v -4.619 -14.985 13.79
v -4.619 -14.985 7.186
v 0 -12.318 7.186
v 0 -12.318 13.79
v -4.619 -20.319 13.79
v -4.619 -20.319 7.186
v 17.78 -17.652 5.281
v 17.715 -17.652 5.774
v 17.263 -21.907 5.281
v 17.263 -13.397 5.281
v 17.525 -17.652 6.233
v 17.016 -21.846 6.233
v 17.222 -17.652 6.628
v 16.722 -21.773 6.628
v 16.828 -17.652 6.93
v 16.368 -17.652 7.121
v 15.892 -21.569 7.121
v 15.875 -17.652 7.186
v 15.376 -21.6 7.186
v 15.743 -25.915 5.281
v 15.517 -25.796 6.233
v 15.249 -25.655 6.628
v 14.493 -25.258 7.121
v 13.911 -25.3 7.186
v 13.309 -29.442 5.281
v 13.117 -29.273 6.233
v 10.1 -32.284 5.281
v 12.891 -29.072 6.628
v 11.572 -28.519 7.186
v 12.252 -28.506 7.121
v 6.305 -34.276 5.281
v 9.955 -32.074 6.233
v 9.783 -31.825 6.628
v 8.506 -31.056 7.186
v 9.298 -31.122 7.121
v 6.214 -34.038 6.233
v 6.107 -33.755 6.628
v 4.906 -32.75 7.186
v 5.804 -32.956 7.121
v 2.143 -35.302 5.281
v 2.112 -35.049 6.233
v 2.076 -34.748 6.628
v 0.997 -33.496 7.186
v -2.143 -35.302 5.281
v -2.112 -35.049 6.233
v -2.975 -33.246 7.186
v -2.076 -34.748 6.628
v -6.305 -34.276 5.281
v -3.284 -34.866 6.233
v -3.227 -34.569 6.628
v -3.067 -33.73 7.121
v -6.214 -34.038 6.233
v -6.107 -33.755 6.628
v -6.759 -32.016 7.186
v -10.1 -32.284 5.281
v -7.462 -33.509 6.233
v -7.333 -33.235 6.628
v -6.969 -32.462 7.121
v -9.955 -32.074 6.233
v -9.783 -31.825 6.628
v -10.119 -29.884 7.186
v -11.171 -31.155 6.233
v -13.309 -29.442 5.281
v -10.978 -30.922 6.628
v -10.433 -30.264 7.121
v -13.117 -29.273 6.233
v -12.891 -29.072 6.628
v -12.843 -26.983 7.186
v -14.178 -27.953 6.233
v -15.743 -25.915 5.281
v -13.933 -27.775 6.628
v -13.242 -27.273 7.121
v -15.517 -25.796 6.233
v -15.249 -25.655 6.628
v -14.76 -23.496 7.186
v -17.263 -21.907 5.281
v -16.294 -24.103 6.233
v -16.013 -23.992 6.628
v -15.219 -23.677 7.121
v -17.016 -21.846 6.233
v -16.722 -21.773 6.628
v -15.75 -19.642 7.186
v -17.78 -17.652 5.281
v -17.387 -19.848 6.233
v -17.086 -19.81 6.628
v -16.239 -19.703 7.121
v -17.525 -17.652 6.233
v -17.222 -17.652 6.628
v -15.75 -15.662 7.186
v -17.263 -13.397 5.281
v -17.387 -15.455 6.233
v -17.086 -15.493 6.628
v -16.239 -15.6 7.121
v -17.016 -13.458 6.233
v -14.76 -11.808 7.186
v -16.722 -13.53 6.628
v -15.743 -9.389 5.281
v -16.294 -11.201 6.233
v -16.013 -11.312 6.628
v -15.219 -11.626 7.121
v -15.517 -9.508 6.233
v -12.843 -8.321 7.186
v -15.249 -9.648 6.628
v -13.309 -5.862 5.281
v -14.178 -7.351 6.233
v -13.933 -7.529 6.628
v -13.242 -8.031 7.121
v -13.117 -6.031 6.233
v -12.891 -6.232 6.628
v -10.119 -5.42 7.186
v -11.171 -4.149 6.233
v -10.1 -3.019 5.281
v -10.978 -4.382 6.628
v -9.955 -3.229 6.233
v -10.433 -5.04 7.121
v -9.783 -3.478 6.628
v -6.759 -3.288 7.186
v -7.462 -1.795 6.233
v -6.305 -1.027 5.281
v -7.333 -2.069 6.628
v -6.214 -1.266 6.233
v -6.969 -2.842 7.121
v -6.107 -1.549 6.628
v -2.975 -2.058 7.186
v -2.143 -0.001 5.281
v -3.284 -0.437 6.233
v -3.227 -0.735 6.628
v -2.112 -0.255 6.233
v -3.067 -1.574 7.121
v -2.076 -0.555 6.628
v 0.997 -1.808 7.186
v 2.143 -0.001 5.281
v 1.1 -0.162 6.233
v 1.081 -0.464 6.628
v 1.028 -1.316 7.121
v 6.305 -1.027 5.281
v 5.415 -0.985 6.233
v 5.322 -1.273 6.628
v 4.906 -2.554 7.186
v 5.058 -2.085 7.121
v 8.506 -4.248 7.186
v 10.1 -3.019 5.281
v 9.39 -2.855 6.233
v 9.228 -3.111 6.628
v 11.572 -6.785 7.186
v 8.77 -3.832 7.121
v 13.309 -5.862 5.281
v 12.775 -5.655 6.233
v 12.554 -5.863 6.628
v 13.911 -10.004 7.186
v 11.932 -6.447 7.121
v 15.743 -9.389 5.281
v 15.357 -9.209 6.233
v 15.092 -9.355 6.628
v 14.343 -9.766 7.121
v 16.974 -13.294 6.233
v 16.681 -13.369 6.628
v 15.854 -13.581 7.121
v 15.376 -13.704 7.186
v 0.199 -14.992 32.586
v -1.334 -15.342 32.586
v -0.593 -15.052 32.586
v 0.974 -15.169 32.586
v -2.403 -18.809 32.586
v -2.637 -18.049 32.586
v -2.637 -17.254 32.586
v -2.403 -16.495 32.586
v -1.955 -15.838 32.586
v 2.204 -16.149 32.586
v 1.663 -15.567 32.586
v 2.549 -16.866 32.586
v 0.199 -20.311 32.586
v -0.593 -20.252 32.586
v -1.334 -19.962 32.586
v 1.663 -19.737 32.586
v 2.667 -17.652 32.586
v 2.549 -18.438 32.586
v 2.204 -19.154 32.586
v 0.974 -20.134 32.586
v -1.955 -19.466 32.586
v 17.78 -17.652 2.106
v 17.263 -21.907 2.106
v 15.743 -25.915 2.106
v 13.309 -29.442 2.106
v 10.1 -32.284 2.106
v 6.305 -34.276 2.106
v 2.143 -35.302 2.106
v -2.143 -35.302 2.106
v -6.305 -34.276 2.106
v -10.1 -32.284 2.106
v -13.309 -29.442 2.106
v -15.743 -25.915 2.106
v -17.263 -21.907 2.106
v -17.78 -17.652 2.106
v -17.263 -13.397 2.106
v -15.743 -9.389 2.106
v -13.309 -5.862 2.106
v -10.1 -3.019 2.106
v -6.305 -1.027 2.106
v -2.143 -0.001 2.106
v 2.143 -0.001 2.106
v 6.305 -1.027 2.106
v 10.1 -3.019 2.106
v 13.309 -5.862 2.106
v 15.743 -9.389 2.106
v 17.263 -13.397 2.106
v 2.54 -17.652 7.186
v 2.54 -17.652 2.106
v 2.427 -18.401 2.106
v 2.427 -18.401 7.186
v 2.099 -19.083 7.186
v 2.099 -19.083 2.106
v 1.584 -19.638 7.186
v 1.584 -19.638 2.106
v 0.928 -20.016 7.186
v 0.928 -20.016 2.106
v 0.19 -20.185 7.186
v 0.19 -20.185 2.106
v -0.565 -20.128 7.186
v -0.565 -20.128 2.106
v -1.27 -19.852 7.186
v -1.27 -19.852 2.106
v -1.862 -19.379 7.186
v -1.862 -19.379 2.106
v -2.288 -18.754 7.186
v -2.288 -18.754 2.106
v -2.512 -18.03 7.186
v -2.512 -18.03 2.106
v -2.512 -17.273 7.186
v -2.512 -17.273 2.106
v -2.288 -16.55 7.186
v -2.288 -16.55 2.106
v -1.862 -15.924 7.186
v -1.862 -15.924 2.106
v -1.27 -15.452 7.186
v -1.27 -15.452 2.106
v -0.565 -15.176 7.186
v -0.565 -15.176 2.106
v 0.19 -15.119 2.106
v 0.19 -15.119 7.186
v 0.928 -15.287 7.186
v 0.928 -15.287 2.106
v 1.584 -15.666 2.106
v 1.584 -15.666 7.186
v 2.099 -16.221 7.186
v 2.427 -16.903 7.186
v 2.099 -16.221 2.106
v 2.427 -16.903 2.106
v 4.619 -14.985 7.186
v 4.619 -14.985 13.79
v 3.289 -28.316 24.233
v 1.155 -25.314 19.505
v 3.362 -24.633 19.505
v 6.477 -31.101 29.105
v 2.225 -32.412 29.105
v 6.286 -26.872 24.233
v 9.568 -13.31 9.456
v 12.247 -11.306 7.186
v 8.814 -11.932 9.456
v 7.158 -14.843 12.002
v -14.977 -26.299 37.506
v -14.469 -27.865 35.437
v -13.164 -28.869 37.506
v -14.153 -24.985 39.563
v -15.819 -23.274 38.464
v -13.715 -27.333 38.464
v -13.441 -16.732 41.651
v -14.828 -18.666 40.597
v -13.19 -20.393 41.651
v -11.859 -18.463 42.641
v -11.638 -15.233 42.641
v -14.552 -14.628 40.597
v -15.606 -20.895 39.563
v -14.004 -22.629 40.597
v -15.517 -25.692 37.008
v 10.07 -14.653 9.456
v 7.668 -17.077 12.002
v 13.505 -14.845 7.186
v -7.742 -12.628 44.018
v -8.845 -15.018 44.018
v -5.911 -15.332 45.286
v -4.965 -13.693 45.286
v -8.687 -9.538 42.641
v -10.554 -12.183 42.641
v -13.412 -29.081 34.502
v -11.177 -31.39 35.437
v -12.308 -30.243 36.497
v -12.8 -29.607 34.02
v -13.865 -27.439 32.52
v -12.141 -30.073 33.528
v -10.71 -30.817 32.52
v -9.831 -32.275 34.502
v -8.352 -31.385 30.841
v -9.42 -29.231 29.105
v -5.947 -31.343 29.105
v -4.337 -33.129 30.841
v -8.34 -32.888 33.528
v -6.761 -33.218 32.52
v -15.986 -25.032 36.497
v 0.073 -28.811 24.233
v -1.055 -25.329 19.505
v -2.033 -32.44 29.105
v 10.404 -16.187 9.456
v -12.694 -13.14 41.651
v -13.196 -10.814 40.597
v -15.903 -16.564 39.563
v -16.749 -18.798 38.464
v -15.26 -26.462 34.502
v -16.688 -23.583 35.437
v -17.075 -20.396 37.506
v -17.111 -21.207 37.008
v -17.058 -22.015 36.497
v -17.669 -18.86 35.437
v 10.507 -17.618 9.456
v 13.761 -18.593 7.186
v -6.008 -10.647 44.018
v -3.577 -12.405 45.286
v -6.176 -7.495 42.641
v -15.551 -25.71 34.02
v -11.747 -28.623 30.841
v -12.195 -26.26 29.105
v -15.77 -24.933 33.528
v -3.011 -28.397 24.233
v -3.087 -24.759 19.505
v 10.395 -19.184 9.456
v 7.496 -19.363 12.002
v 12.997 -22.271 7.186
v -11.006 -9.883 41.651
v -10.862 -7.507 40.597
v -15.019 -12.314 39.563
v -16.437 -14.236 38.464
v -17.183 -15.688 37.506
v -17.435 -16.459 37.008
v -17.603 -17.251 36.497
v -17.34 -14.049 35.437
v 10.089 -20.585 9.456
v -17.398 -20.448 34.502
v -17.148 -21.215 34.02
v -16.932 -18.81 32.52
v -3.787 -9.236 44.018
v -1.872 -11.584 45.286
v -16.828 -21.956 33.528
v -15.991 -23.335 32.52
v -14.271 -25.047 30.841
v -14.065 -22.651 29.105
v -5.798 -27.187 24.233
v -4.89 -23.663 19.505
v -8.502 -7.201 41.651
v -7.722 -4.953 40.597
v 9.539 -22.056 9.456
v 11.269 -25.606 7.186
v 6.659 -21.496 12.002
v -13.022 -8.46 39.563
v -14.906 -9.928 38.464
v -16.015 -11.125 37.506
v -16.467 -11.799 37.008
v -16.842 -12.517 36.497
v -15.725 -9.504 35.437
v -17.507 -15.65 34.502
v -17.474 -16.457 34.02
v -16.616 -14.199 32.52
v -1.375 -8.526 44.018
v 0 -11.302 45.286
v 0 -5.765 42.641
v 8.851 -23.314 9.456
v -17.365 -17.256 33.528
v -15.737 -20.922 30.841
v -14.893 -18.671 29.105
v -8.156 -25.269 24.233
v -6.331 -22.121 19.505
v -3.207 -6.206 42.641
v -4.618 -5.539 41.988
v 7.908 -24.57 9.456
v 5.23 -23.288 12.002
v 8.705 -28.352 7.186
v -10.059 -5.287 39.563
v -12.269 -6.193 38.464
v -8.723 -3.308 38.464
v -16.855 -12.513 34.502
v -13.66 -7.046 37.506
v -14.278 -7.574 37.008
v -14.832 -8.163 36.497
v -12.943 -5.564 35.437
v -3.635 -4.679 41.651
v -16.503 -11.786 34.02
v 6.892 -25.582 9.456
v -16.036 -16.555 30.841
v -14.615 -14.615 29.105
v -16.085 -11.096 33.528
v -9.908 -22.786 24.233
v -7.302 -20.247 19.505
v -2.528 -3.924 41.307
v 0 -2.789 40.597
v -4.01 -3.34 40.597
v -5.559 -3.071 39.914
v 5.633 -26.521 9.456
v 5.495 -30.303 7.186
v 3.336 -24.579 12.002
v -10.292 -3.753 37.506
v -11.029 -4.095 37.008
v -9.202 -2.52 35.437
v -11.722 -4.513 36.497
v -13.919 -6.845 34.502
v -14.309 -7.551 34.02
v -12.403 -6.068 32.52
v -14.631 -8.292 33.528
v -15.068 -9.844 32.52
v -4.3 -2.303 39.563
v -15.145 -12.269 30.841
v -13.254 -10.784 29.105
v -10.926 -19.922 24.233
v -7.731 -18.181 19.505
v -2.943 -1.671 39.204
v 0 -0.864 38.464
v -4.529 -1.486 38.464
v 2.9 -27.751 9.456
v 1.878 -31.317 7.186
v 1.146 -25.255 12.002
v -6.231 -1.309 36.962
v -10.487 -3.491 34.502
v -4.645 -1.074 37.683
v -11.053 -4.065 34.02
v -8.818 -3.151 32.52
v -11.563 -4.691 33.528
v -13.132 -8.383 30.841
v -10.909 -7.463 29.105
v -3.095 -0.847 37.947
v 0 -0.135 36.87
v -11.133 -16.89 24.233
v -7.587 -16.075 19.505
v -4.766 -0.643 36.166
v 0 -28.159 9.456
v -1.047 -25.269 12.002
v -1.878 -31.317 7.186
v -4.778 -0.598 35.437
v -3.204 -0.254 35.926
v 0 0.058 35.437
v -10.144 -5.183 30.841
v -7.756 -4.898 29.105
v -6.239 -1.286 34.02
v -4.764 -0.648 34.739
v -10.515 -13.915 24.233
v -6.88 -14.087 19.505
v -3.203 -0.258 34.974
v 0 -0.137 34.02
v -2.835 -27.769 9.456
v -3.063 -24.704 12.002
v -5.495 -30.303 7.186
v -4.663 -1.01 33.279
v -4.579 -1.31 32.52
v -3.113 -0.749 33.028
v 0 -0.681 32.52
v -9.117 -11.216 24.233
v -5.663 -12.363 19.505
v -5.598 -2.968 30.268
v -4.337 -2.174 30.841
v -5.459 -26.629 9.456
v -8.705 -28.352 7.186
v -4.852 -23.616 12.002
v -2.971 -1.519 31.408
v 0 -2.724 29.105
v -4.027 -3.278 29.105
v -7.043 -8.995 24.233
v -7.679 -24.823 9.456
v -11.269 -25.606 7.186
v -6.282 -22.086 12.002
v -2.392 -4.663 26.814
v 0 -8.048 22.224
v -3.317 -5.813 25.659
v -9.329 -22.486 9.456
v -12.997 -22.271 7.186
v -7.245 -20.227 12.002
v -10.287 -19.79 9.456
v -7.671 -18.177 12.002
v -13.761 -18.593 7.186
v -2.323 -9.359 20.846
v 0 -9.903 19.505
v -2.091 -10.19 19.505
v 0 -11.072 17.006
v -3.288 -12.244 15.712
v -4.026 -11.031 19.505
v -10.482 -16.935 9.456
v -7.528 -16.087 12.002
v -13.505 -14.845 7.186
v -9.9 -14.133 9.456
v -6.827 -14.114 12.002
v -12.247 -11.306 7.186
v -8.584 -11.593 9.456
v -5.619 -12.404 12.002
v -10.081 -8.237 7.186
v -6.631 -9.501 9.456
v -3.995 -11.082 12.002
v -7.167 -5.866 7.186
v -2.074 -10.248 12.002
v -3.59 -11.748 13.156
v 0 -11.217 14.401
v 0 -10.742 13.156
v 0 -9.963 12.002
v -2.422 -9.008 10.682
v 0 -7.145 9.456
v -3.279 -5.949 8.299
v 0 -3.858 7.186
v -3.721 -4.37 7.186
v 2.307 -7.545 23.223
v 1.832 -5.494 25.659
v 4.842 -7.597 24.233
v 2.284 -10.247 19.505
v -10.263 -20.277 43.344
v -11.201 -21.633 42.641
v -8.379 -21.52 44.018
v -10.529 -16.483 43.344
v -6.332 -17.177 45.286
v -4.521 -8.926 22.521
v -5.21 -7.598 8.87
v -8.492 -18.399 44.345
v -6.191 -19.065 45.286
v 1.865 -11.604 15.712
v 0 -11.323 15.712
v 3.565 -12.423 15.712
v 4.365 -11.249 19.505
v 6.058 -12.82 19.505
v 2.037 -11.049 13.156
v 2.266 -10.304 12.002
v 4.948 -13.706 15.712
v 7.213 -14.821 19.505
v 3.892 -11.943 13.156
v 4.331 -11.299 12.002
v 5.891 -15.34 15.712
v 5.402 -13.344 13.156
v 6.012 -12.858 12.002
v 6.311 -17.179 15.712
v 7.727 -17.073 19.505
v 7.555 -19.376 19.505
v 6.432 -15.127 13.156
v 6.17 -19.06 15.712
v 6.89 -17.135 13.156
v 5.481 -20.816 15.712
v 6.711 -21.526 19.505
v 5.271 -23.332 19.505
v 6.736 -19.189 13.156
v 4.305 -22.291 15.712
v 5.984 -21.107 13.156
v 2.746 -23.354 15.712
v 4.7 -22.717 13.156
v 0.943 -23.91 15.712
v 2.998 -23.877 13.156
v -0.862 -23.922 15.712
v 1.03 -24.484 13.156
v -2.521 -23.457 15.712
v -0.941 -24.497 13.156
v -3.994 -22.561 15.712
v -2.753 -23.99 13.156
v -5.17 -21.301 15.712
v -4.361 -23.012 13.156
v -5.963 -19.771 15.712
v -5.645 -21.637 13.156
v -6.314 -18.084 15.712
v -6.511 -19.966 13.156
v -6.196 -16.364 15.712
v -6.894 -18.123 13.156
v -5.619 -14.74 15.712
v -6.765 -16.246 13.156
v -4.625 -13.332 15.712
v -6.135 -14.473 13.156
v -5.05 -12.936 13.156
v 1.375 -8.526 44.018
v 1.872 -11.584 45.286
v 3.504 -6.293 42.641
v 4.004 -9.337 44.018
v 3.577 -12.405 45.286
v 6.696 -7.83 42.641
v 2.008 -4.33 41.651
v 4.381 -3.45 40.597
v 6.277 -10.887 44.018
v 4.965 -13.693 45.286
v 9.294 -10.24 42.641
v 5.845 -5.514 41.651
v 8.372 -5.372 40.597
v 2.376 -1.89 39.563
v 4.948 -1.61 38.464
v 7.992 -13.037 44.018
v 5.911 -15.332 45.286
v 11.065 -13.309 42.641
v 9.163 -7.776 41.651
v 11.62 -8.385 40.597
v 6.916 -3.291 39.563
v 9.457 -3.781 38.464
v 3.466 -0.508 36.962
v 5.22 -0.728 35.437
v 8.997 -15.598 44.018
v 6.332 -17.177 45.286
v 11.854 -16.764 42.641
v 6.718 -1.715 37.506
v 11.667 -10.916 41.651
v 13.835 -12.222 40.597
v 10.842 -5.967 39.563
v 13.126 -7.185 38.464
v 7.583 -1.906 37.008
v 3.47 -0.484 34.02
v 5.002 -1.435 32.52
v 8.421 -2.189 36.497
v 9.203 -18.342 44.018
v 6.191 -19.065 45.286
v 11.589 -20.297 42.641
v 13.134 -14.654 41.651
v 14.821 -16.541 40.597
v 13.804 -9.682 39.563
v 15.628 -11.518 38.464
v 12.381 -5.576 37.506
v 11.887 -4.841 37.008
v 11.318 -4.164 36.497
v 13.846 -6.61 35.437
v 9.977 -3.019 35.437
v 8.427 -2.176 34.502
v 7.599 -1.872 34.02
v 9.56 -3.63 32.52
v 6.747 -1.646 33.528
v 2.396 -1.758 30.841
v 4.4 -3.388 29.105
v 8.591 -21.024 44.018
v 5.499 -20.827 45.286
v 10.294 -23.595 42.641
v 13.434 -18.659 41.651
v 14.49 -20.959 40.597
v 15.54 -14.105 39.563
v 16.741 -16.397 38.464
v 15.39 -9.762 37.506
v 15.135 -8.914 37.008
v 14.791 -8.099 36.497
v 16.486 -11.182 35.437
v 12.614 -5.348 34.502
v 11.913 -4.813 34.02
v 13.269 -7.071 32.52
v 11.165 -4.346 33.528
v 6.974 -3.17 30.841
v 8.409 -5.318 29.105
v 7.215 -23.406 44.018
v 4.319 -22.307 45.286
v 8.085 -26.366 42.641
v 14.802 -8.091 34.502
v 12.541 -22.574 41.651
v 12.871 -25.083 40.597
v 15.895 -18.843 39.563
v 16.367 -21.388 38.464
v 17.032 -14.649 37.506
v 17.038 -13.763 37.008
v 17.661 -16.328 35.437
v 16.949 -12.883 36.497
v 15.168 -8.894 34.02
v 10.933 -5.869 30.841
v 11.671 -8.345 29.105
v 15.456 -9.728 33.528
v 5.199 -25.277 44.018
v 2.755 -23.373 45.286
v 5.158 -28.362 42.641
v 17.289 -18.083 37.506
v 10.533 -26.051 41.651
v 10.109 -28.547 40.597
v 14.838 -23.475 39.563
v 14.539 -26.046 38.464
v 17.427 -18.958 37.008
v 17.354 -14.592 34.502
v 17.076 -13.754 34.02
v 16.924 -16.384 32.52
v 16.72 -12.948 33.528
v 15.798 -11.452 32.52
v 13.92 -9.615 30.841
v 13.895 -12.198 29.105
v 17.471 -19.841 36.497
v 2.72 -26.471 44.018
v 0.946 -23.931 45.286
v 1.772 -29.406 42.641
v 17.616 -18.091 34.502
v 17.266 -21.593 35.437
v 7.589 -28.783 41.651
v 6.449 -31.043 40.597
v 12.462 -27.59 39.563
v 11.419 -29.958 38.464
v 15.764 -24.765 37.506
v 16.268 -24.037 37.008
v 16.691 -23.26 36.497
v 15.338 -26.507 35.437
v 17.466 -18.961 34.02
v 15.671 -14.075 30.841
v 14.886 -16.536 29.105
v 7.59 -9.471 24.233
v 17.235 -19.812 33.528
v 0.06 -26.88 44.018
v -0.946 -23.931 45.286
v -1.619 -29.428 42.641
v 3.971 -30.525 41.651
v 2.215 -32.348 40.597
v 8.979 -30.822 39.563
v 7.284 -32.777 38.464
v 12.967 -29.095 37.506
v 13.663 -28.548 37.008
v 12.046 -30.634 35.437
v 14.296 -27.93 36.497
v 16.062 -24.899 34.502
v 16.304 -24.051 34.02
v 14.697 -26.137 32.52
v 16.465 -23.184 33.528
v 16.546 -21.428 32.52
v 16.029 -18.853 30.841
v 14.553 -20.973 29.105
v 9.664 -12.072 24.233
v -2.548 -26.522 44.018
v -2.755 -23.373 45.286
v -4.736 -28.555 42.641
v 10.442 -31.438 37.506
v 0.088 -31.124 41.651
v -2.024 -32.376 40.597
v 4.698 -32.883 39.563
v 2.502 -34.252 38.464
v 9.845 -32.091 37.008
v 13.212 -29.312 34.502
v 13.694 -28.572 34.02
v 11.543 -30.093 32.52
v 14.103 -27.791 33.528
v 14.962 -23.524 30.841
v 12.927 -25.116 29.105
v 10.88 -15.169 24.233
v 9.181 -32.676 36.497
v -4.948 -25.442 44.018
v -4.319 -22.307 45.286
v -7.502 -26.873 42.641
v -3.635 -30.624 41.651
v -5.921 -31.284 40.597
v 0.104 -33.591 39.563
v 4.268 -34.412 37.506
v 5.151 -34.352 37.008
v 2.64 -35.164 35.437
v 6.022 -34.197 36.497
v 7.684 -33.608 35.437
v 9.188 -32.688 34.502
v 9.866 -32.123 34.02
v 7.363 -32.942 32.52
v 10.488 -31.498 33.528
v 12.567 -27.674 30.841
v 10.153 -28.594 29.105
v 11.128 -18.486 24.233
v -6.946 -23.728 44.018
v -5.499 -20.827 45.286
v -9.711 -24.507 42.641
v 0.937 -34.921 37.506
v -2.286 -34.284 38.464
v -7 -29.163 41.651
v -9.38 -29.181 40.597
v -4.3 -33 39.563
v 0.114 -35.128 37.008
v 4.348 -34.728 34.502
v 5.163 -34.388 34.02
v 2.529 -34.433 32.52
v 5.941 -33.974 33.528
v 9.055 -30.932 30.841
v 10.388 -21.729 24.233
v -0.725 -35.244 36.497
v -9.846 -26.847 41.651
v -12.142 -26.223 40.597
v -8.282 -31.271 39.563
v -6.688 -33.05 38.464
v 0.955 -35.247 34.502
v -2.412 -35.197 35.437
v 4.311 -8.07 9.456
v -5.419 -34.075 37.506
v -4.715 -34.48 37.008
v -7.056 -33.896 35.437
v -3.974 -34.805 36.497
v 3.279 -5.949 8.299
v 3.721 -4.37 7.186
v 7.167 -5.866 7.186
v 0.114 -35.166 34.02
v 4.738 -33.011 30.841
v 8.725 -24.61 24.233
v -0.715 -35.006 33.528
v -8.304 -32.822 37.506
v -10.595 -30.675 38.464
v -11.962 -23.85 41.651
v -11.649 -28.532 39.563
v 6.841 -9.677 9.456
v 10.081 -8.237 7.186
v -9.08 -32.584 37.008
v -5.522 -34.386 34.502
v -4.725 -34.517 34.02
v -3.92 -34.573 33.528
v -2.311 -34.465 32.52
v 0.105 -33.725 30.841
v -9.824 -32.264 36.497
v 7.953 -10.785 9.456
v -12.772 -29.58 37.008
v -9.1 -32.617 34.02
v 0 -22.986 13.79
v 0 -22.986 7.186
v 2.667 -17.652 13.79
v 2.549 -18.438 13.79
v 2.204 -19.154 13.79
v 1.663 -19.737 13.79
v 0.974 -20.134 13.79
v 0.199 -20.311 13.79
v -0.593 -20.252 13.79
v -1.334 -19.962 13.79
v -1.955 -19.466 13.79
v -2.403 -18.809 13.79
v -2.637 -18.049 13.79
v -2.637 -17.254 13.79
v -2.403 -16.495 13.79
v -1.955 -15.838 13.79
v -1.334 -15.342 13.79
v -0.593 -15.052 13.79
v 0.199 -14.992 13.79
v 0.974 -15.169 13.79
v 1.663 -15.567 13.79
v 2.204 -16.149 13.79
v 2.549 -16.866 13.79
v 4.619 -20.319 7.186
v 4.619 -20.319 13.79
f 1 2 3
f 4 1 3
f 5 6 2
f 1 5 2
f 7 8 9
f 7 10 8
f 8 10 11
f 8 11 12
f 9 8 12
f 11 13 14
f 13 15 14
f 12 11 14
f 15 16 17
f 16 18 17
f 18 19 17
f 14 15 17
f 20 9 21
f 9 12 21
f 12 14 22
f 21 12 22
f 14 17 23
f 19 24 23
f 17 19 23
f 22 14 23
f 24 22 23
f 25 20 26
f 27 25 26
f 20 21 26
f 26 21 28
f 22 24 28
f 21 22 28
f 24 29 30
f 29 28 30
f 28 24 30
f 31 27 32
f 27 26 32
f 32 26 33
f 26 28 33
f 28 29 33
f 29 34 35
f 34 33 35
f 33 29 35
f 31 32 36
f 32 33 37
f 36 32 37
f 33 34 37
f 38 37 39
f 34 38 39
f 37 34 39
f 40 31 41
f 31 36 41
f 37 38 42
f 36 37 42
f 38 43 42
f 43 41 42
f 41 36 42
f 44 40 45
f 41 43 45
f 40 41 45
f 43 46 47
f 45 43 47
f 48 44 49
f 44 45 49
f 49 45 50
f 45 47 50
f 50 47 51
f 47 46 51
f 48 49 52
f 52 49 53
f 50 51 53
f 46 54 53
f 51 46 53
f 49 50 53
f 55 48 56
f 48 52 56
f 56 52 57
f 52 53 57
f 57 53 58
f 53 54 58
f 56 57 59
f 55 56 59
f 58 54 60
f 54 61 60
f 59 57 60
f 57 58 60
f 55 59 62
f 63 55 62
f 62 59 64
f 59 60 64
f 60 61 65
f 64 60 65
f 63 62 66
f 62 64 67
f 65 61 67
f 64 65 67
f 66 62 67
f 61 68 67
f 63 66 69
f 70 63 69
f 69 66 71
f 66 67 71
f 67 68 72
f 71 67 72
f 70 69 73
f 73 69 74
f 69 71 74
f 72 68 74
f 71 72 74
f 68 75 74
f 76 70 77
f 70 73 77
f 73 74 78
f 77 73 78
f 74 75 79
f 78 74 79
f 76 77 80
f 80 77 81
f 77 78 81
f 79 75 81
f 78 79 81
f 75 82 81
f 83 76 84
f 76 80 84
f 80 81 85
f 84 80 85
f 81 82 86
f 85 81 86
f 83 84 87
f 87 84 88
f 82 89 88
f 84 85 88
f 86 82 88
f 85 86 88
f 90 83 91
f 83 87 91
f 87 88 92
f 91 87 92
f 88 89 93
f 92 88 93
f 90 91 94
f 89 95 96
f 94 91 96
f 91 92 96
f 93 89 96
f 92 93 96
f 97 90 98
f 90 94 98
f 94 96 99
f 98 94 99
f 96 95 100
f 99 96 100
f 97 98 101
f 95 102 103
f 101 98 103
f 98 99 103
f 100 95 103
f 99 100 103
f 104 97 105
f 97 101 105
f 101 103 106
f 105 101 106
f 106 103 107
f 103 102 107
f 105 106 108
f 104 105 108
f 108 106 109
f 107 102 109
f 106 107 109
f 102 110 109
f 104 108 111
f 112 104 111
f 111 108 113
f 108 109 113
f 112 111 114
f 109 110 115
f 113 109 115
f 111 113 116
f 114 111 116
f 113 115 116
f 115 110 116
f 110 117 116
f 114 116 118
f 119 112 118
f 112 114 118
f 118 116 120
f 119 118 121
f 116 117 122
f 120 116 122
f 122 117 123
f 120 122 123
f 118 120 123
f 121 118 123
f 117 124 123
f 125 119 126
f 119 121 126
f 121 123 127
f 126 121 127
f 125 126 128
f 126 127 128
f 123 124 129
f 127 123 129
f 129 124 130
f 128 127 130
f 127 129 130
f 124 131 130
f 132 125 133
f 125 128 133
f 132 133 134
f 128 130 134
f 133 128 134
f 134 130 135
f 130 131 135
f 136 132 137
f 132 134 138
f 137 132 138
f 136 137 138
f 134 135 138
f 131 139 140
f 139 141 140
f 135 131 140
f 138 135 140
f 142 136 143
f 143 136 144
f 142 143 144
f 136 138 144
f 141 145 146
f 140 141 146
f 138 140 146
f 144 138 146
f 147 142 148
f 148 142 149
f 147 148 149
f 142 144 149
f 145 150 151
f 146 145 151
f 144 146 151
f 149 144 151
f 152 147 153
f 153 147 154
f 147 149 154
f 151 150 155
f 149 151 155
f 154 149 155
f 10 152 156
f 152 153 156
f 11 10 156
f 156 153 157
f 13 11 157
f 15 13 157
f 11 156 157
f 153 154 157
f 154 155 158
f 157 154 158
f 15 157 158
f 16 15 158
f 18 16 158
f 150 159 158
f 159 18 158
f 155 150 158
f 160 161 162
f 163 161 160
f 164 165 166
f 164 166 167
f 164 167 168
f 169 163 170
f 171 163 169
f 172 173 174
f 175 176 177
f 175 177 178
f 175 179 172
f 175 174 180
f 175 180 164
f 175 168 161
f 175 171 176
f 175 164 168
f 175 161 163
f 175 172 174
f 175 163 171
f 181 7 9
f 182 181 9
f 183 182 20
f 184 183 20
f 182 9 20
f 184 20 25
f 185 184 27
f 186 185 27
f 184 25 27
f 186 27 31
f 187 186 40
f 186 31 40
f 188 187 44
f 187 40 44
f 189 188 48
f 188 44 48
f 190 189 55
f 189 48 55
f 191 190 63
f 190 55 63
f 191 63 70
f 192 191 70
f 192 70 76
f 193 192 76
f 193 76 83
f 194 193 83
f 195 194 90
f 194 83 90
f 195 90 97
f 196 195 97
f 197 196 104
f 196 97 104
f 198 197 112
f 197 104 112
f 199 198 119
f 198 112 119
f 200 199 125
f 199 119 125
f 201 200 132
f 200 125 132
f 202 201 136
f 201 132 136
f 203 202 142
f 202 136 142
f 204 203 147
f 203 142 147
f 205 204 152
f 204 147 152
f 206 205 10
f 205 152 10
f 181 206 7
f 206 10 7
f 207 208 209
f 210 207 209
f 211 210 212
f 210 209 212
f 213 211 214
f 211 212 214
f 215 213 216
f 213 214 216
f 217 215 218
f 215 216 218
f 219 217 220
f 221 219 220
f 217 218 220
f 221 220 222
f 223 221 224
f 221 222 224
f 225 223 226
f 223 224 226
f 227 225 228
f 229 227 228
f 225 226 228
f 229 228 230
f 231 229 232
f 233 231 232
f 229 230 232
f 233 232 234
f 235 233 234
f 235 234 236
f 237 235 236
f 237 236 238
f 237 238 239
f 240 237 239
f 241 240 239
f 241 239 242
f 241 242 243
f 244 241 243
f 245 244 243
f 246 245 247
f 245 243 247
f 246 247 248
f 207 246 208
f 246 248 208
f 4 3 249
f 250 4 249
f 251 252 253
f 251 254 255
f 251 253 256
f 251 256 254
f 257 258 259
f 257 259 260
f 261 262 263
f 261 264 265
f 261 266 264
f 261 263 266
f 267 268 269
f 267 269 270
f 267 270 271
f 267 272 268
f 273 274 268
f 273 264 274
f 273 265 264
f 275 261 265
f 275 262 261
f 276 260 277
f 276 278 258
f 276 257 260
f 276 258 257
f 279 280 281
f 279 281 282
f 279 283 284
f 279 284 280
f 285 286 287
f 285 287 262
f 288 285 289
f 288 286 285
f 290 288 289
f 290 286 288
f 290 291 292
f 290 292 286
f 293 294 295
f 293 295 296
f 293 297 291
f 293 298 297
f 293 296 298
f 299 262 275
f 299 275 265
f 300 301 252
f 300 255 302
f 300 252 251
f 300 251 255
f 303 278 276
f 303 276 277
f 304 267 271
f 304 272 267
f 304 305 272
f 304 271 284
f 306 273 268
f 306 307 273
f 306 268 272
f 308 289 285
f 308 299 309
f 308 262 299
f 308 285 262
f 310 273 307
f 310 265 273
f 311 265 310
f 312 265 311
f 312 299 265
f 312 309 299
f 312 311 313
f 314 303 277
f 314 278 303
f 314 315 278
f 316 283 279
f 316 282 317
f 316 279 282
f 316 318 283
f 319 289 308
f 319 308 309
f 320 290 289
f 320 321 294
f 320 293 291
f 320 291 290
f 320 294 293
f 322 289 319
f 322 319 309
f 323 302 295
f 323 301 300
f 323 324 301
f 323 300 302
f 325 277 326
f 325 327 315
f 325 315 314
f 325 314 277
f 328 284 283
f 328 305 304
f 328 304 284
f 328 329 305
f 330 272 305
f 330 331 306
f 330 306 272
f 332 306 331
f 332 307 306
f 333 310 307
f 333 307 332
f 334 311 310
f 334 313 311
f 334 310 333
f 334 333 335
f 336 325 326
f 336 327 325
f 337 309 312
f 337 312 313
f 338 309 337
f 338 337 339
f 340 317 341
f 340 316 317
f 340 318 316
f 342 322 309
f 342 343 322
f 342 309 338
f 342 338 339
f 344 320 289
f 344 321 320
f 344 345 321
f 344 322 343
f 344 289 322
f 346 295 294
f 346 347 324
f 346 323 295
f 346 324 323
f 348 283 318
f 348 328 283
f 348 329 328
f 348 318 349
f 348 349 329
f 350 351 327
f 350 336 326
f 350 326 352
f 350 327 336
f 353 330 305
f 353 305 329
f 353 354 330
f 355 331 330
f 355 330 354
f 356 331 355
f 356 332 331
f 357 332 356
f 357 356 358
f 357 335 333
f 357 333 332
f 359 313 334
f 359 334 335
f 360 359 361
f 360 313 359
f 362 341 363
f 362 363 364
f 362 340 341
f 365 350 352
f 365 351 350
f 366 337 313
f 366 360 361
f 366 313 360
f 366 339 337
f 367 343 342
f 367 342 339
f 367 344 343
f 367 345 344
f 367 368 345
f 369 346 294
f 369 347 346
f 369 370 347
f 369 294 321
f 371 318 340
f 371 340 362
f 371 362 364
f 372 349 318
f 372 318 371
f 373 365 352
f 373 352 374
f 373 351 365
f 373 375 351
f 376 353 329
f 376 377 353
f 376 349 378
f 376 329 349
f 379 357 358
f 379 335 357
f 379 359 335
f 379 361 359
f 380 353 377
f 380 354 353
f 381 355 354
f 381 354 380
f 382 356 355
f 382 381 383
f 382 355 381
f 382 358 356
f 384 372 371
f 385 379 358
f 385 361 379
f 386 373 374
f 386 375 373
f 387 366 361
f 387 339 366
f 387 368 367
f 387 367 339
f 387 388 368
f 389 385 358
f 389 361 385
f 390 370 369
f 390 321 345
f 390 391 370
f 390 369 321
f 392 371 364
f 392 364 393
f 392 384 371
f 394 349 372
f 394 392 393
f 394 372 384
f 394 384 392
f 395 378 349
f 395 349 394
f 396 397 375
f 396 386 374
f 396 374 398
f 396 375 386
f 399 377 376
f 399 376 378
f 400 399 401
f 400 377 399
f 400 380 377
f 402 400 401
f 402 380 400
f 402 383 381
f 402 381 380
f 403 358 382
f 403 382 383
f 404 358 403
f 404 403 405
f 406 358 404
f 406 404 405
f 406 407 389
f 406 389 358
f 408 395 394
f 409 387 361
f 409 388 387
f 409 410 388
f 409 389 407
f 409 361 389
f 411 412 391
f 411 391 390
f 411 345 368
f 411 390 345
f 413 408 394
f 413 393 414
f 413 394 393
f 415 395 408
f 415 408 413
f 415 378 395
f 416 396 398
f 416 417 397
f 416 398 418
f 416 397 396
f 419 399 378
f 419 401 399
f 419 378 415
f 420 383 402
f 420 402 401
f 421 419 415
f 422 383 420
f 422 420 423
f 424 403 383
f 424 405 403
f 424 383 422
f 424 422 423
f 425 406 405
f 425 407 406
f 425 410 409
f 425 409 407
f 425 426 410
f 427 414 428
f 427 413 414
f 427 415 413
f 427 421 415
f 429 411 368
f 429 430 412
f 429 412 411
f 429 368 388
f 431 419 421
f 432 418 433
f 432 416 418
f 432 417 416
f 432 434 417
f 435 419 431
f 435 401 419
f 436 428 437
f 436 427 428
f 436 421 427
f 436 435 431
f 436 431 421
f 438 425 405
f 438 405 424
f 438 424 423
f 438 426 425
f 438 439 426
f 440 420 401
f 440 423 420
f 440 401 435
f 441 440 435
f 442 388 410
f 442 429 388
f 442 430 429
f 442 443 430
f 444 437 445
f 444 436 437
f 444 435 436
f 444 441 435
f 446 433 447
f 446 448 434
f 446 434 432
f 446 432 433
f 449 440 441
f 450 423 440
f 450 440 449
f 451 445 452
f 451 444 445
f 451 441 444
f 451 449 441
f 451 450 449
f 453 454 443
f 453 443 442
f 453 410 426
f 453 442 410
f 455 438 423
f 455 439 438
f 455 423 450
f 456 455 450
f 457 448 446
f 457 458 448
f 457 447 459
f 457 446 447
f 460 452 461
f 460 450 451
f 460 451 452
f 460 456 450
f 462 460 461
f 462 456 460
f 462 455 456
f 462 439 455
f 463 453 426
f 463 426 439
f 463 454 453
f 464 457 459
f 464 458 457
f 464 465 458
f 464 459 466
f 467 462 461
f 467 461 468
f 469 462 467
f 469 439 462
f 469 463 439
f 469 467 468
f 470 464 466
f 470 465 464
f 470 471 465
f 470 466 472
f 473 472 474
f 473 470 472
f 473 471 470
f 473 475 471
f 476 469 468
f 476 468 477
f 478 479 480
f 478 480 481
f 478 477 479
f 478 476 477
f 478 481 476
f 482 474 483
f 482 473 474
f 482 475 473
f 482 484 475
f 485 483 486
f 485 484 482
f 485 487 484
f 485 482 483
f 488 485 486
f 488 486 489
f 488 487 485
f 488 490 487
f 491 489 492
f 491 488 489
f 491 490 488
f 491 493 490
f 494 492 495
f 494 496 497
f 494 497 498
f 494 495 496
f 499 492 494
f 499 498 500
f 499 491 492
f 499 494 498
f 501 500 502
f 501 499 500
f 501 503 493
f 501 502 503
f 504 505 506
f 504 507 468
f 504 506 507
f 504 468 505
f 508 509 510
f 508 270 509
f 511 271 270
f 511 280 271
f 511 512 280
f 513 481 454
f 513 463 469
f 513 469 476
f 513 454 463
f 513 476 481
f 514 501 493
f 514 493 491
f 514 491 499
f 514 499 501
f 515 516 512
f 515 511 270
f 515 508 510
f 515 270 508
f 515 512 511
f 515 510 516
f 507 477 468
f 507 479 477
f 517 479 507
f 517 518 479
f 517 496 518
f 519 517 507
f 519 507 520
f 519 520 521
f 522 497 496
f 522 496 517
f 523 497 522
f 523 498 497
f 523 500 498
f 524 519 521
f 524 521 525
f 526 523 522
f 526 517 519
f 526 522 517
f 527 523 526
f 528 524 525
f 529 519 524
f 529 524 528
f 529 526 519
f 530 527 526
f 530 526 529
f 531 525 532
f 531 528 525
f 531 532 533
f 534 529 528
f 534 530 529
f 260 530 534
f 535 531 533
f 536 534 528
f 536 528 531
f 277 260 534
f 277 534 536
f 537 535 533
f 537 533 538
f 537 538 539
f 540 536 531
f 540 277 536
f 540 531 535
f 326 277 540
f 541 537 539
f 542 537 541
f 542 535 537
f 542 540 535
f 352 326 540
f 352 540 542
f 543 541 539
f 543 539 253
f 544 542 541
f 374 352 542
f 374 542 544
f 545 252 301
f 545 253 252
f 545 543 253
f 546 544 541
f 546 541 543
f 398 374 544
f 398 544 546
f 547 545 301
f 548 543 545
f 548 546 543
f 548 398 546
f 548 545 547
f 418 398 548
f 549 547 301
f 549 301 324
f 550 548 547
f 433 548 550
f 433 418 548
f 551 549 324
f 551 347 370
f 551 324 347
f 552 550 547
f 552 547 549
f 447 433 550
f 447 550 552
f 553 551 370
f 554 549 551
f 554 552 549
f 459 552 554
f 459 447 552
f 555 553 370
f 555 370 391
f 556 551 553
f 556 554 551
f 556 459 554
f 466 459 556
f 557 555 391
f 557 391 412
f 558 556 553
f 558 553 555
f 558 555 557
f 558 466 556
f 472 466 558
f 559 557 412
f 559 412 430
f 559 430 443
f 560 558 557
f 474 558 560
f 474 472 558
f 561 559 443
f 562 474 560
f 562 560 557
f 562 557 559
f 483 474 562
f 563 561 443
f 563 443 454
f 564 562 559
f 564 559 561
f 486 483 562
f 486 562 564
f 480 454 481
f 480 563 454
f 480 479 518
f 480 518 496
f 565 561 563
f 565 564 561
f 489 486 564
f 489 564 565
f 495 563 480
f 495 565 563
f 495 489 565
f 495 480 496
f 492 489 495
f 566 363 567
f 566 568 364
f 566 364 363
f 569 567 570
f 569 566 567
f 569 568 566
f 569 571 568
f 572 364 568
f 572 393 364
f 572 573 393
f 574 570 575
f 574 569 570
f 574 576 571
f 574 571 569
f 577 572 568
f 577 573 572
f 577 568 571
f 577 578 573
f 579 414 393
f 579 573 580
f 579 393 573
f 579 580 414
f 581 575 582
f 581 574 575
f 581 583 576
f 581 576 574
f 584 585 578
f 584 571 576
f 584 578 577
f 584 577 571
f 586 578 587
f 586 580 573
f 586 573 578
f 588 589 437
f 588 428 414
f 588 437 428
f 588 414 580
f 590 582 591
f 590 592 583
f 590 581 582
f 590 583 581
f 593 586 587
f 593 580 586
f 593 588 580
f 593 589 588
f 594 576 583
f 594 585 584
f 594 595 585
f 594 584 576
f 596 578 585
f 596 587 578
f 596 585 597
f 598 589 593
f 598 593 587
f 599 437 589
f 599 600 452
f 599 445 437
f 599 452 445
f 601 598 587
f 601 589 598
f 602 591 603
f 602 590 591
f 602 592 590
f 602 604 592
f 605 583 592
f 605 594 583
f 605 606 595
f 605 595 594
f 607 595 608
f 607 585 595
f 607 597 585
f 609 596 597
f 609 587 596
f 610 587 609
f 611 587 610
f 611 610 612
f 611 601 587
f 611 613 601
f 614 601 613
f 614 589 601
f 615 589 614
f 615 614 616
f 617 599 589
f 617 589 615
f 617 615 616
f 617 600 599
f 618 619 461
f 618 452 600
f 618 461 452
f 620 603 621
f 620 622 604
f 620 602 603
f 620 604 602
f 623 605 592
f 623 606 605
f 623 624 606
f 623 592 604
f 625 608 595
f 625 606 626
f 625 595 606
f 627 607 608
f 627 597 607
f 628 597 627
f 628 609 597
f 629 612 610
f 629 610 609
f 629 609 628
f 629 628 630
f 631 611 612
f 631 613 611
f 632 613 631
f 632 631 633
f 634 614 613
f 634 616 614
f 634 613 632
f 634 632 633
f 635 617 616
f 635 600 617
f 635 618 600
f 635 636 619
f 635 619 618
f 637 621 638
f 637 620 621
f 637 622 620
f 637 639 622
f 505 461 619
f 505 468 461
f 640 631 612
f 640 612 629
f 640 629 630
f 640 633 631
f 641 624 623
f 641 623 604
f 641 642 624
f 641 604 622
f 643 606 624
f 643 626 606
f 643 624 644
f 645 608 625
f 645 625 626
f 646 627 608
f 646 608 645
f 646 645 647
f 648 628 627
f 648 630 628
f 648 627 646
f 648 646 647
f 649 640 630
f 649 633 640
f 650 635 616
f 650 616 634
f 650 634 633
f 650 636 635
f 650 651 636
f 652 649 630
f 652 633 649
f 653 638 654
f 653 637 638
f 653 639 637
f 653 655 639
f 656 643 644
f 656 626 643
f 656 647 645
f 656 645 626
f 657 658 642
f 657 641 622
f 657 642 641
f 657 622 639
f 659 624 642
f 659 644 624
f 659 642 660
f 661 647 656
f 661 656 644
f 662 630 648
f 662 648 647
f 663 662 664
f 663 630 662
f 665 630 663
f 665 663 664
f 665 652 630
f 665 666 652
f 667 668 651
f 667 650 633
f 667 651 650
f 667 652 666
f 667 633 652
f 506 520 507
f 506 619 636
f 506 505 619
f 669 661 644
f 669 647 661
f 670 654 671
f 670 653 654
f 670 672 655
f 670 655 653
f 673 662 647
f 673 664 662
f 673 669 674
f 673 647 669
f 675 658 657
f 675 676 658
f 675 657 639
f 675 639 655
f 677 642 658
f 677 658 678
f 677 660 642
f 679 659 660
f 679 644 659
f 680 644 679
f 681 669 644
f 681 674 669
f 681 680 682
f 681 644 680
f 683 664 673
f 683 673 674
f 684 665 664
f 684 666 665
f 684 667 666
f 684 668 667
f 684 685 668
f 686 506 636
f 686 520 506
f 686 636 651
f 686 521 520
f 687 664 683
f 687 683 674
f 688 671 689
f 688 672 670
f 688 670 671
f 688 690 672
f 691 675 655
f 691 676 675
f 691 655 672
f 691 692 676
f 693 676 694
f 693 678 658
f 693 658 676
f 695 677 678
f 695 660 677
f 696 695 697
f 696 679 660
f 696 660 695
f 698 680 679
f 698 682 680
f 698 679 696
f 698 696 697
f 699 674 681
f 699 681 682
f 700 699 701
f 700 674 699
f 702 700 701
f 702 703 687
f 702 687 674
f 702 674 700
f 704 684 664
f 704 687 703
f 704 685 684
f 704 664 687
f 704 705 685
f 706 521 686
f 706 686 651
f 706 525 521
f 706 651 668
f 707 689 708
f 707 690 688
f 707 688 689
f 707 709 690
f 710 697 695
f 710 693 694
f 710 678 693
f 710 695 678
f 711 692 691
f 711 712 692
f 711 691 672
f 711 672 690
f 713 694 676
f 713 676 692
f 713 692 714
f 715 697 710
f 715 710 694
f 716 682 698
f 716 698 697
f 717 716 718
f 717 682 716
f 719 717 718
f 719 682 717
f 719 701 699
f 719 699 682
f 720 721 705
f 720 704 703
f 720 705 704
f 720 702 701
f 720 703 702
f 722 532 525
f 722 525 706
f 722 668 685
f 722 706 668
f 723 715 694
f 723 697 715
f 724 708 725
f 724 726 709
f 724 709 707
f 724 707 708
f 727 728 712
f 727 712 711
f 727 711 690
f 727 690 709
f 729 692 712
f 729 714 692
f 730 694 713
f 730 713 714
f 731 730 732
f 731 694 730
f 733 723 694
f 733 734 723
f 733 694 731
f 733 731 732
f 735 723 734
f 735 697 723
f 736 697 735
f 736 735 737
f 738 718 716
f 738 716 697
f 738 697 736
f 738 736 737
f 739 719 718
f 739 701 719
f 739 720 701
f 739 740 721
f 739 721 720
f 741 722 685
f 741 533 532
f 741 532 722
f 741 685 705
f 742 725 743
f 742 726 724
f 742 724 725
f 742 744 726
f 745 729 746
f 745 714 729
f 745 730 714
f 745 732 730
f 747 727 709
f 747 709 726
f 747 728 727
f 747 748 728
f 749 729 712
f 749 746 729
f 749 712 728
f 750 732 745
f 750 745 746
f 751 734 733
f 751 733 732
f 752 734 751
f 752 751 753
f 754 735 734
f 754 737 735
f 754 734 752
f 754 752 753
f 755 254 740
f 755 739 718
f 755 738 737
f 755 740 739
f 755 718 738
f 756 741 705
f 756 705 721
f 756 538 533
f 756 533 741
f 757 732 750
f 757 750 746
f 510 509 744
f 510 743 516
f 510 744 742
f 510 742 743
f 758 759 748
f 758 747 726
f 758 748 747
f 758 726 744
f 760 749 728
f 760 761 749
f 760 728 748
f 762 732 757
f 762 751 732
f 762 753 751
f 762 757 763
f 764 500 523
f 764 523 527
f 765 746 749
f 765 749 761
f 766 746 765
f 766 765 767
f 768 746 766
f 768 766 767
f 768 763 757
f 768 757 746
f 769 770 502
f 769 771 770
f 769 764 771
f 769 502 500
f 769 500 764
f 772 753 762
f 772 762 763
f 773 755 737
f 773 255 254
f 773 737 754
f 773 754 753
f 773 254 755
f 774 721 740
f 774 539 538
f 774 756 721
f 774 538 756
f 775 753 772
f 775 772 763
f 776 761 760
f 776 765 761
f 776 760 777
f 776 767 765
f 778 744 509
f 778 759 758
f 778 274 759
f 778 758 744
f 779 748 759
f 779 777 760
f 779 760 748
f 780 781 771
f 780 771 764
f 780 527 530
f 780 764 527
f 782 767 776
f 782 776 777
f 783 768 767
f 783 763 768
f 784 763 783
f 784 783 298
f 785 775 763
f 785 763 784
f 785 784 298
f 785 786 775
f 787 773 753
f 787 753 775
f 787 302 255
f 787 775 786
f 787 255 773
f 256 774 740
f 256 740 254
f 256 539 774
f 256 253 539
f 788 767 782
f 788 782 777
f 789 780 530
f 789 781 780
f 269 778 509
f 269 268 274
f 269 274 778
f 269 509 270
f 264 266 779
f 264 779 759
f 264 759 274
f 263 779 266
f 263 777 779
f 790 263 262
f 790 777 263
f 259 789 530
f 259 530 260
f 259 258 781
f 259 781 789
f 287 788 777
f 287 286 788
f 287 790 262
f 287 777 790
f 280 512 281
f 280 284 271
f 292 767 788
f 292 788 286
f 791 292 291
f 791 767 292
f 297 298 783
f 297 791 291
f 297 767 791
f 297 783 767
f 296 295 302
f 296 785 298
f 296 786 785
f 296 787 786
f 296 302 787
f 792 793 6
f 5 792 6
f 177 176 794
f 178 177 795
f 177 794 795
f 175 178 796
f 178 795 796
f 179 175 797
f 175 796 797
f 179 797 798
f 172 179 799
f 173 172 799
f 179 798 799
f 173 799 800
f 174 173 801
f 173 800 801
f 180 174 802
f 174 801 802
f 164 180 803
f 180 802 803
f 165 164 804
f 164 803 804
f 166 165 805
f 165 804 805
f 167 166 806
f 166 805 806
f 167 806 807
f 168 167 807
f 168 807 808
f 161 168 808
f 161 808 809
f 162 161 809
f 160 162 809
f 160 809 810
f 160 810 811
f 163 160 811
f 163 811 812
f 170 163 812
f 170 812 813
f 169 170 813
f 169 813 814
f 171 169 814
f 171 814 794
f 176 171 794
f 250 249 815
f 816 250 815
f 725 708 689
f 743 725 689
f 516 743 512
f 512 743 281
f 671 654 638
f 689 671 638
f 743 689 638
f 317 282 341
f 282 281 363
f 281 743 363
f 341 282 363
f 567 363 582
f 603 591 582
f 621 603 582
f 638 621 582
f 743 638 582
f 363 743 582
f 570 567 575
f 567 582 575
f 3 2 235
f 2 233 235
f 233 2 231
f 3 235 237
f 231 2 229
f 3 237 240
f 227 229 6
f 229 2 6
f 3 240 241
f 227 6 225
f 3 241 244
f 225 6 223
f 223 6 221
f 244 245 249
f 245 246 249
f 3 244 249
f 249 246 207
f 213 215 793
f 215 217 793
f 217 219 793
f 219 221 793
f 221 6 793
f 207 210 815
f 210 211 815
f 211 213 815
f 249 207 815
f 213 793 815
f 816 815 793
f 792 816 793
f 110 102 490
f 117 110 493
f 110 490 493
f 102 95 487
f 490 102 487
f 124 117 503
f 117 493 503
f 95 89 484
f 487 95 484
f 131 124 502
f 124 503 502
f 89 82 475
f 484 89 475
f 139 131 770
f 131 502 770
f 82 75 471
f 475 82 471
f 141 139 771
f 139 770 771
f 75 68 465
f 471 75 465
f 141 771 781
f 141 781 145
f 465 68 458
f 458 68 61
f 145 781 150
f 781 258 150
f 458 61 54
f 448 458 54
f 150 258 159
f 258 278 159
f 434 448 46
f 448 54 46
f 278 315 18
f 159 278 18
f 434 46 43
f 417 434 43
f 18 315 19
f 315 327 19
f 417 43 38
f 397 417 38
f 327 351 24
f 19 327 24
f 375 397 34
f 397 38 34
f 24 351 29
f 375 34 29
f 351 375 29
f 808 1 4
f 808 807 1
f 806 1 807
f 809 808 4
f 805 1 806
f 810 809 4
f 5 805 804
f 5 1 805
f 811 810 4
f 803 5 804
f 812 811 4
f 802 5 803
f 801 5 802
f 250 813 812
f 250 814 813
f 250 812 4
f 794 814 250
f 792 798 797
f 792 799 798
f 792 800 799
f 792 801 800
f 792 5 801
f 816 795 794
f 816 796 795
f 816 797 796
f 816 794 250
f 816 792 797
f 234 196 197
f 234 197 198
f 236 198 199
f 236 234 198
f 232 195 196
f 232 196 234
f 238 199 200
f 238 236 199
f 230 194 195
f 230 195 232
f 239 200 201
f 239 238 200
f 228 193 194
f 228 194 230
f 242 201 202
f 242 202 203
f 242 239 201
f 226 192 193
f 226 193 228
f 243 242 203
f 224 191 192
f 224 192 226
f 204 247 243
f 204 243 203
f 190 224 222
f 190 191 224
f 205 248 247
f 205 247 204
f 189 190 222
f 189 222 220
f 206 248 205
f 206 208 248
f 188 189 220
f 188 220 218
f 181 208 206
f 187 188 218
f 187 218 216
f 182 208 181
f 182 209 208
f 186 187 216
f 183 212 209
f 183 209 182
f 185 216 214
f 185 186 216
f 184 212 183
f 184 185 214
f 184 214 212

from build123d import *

# Parameters (mm, degrees)
F2_R           = 2.667
F3_DEPTH       = 25.4
F4_R           = 2.667
F5_DEPTH       = 25.654
F6_DEPTH       = 25.4
F8_DEPTH       = 6.604
F9_R           = 17.78
F10_DEPTH      = 5.08
F11_R          = 2.54
F12_DEPTH      = 5.08
F12_DEPTH_BACK = 25.4
F13_R          = 1.905


with BuildPart() as f1:
    # F0 (on Right) → F1 (revolve)
    with BuildSketch(Plane.YZ):
        with BuildLine():
            Line((-11.3018388831, 45.2855030986), (-17.6518388831, 45.2855030986))
            Line((-17.6518388831, 45.2855030986), (-17.6518388831, 7.1855030986))
            Line((-17.6518388831, 7.1855030986), (-3.8583281767, 7.1855030986))
            add(Edge.make_bspline(
                [(-11.3018388831, 45.2855030986), (-4.9886537294, 42.6732938219), (7.461546199, 35.5990041809), (-17.8341972837, 15.5947792754), (-7.3326148912, 9.581982695), (-3.8583281767, 7.1855030986)],
                knots=[0, 0, 0, 0, 0.327872835, 0.7175530921, 1, 1, 1, 1], degree=3))
        make_face()
    revolve(axis=Axis((0, -17.6518388831, 26.2355030986), (0, 0, -1)))

    # F2 (on face) → F3 (join)
    with BuildSketch(Plane(origin=(0, 0, 7.1855030986), x_dir=(1, 0, 0), z_dir=(0, 0, -1))):
        with Locations((0, 17.6518388831)):
            Circle(F2_R)
    extrude(amount=-F3_DEPTH)

    # F4 (on face) → F5 (join)
    with BuildSketch(Plane(origin=(0, 0, 7.1855030986), x_dir=(1, 0, 0), z_dir=(0, 0, -1))):
        with Locations((0, 17.6518388831)):
            Circle(F4_R)
    extrude(amount=-F5_DEPTH)

    # F4 (on face) → F6 (cut)
    with BuildSketch(Plane(origin=(0, 0, 7.1855030986), x_dir=(1, 0, 0), z_dir=(0, 0, -1))):
        with Locations((0, 17.6518388831)):
            Circle(F4_R)
    extrude(amount=-F6_DEPTH, mode=Mode.SUBTRACT)

    # F7 (on face) → F8 (cut)
    with BuildSketch(Plane(origin=(0, 0, 7.1855030986), x_dir=(1, 0, 0), z_dir=(0, 0, -1))):
        Polygon((-4.6193795038, 20.3188388831), (-4.6193795038, 14.9848388831), (0, 12.3178388831), (4.6193795038, 14.9848388831), (4.6193795038, 20.3188388831), (0, 22.9858388831), align=None)
    extrude(amount=-F8_DEPTH, mode=Mode.SUBTRACT)

    # F9 (on face) → F10 (join)
    with BuildSketch(Plane(origin=(0, 0, 7.1855030986), x_dir=(1, 0, 0), z_dir=(0, 0, -1))):
        with Locations((0, 17.6518388831)):
            Circle(F9_R)
    extrude(amount=F10_DEPTH)

    # F11 (on face) → F12 (cut, two sides)
    with BuildSketch(Plane(origin=(0, 0, 2.1055030986), x_dir=(1, 0, 0), z_dir=(0, 0, -1))) as f12_sk:
        with Locations((0, 17.6518388831)):
            Circle(F11_R)
    extrude(amount=-F12_DEPTH, mode=Mode.SUBTRACT)
    extrude(f12_sk.sketch, amount=F12_DEPTH_BACK, mode=Mode.SUBTRACT)

    # F13
    f13_edges = [f1.edges().sort_by_distance(p)[0] for p in [
        (-17.78, -17.651839, 7.185503),
    ]]
    fillet(f13_edges, radius=F13_R)


solid = f1.part
